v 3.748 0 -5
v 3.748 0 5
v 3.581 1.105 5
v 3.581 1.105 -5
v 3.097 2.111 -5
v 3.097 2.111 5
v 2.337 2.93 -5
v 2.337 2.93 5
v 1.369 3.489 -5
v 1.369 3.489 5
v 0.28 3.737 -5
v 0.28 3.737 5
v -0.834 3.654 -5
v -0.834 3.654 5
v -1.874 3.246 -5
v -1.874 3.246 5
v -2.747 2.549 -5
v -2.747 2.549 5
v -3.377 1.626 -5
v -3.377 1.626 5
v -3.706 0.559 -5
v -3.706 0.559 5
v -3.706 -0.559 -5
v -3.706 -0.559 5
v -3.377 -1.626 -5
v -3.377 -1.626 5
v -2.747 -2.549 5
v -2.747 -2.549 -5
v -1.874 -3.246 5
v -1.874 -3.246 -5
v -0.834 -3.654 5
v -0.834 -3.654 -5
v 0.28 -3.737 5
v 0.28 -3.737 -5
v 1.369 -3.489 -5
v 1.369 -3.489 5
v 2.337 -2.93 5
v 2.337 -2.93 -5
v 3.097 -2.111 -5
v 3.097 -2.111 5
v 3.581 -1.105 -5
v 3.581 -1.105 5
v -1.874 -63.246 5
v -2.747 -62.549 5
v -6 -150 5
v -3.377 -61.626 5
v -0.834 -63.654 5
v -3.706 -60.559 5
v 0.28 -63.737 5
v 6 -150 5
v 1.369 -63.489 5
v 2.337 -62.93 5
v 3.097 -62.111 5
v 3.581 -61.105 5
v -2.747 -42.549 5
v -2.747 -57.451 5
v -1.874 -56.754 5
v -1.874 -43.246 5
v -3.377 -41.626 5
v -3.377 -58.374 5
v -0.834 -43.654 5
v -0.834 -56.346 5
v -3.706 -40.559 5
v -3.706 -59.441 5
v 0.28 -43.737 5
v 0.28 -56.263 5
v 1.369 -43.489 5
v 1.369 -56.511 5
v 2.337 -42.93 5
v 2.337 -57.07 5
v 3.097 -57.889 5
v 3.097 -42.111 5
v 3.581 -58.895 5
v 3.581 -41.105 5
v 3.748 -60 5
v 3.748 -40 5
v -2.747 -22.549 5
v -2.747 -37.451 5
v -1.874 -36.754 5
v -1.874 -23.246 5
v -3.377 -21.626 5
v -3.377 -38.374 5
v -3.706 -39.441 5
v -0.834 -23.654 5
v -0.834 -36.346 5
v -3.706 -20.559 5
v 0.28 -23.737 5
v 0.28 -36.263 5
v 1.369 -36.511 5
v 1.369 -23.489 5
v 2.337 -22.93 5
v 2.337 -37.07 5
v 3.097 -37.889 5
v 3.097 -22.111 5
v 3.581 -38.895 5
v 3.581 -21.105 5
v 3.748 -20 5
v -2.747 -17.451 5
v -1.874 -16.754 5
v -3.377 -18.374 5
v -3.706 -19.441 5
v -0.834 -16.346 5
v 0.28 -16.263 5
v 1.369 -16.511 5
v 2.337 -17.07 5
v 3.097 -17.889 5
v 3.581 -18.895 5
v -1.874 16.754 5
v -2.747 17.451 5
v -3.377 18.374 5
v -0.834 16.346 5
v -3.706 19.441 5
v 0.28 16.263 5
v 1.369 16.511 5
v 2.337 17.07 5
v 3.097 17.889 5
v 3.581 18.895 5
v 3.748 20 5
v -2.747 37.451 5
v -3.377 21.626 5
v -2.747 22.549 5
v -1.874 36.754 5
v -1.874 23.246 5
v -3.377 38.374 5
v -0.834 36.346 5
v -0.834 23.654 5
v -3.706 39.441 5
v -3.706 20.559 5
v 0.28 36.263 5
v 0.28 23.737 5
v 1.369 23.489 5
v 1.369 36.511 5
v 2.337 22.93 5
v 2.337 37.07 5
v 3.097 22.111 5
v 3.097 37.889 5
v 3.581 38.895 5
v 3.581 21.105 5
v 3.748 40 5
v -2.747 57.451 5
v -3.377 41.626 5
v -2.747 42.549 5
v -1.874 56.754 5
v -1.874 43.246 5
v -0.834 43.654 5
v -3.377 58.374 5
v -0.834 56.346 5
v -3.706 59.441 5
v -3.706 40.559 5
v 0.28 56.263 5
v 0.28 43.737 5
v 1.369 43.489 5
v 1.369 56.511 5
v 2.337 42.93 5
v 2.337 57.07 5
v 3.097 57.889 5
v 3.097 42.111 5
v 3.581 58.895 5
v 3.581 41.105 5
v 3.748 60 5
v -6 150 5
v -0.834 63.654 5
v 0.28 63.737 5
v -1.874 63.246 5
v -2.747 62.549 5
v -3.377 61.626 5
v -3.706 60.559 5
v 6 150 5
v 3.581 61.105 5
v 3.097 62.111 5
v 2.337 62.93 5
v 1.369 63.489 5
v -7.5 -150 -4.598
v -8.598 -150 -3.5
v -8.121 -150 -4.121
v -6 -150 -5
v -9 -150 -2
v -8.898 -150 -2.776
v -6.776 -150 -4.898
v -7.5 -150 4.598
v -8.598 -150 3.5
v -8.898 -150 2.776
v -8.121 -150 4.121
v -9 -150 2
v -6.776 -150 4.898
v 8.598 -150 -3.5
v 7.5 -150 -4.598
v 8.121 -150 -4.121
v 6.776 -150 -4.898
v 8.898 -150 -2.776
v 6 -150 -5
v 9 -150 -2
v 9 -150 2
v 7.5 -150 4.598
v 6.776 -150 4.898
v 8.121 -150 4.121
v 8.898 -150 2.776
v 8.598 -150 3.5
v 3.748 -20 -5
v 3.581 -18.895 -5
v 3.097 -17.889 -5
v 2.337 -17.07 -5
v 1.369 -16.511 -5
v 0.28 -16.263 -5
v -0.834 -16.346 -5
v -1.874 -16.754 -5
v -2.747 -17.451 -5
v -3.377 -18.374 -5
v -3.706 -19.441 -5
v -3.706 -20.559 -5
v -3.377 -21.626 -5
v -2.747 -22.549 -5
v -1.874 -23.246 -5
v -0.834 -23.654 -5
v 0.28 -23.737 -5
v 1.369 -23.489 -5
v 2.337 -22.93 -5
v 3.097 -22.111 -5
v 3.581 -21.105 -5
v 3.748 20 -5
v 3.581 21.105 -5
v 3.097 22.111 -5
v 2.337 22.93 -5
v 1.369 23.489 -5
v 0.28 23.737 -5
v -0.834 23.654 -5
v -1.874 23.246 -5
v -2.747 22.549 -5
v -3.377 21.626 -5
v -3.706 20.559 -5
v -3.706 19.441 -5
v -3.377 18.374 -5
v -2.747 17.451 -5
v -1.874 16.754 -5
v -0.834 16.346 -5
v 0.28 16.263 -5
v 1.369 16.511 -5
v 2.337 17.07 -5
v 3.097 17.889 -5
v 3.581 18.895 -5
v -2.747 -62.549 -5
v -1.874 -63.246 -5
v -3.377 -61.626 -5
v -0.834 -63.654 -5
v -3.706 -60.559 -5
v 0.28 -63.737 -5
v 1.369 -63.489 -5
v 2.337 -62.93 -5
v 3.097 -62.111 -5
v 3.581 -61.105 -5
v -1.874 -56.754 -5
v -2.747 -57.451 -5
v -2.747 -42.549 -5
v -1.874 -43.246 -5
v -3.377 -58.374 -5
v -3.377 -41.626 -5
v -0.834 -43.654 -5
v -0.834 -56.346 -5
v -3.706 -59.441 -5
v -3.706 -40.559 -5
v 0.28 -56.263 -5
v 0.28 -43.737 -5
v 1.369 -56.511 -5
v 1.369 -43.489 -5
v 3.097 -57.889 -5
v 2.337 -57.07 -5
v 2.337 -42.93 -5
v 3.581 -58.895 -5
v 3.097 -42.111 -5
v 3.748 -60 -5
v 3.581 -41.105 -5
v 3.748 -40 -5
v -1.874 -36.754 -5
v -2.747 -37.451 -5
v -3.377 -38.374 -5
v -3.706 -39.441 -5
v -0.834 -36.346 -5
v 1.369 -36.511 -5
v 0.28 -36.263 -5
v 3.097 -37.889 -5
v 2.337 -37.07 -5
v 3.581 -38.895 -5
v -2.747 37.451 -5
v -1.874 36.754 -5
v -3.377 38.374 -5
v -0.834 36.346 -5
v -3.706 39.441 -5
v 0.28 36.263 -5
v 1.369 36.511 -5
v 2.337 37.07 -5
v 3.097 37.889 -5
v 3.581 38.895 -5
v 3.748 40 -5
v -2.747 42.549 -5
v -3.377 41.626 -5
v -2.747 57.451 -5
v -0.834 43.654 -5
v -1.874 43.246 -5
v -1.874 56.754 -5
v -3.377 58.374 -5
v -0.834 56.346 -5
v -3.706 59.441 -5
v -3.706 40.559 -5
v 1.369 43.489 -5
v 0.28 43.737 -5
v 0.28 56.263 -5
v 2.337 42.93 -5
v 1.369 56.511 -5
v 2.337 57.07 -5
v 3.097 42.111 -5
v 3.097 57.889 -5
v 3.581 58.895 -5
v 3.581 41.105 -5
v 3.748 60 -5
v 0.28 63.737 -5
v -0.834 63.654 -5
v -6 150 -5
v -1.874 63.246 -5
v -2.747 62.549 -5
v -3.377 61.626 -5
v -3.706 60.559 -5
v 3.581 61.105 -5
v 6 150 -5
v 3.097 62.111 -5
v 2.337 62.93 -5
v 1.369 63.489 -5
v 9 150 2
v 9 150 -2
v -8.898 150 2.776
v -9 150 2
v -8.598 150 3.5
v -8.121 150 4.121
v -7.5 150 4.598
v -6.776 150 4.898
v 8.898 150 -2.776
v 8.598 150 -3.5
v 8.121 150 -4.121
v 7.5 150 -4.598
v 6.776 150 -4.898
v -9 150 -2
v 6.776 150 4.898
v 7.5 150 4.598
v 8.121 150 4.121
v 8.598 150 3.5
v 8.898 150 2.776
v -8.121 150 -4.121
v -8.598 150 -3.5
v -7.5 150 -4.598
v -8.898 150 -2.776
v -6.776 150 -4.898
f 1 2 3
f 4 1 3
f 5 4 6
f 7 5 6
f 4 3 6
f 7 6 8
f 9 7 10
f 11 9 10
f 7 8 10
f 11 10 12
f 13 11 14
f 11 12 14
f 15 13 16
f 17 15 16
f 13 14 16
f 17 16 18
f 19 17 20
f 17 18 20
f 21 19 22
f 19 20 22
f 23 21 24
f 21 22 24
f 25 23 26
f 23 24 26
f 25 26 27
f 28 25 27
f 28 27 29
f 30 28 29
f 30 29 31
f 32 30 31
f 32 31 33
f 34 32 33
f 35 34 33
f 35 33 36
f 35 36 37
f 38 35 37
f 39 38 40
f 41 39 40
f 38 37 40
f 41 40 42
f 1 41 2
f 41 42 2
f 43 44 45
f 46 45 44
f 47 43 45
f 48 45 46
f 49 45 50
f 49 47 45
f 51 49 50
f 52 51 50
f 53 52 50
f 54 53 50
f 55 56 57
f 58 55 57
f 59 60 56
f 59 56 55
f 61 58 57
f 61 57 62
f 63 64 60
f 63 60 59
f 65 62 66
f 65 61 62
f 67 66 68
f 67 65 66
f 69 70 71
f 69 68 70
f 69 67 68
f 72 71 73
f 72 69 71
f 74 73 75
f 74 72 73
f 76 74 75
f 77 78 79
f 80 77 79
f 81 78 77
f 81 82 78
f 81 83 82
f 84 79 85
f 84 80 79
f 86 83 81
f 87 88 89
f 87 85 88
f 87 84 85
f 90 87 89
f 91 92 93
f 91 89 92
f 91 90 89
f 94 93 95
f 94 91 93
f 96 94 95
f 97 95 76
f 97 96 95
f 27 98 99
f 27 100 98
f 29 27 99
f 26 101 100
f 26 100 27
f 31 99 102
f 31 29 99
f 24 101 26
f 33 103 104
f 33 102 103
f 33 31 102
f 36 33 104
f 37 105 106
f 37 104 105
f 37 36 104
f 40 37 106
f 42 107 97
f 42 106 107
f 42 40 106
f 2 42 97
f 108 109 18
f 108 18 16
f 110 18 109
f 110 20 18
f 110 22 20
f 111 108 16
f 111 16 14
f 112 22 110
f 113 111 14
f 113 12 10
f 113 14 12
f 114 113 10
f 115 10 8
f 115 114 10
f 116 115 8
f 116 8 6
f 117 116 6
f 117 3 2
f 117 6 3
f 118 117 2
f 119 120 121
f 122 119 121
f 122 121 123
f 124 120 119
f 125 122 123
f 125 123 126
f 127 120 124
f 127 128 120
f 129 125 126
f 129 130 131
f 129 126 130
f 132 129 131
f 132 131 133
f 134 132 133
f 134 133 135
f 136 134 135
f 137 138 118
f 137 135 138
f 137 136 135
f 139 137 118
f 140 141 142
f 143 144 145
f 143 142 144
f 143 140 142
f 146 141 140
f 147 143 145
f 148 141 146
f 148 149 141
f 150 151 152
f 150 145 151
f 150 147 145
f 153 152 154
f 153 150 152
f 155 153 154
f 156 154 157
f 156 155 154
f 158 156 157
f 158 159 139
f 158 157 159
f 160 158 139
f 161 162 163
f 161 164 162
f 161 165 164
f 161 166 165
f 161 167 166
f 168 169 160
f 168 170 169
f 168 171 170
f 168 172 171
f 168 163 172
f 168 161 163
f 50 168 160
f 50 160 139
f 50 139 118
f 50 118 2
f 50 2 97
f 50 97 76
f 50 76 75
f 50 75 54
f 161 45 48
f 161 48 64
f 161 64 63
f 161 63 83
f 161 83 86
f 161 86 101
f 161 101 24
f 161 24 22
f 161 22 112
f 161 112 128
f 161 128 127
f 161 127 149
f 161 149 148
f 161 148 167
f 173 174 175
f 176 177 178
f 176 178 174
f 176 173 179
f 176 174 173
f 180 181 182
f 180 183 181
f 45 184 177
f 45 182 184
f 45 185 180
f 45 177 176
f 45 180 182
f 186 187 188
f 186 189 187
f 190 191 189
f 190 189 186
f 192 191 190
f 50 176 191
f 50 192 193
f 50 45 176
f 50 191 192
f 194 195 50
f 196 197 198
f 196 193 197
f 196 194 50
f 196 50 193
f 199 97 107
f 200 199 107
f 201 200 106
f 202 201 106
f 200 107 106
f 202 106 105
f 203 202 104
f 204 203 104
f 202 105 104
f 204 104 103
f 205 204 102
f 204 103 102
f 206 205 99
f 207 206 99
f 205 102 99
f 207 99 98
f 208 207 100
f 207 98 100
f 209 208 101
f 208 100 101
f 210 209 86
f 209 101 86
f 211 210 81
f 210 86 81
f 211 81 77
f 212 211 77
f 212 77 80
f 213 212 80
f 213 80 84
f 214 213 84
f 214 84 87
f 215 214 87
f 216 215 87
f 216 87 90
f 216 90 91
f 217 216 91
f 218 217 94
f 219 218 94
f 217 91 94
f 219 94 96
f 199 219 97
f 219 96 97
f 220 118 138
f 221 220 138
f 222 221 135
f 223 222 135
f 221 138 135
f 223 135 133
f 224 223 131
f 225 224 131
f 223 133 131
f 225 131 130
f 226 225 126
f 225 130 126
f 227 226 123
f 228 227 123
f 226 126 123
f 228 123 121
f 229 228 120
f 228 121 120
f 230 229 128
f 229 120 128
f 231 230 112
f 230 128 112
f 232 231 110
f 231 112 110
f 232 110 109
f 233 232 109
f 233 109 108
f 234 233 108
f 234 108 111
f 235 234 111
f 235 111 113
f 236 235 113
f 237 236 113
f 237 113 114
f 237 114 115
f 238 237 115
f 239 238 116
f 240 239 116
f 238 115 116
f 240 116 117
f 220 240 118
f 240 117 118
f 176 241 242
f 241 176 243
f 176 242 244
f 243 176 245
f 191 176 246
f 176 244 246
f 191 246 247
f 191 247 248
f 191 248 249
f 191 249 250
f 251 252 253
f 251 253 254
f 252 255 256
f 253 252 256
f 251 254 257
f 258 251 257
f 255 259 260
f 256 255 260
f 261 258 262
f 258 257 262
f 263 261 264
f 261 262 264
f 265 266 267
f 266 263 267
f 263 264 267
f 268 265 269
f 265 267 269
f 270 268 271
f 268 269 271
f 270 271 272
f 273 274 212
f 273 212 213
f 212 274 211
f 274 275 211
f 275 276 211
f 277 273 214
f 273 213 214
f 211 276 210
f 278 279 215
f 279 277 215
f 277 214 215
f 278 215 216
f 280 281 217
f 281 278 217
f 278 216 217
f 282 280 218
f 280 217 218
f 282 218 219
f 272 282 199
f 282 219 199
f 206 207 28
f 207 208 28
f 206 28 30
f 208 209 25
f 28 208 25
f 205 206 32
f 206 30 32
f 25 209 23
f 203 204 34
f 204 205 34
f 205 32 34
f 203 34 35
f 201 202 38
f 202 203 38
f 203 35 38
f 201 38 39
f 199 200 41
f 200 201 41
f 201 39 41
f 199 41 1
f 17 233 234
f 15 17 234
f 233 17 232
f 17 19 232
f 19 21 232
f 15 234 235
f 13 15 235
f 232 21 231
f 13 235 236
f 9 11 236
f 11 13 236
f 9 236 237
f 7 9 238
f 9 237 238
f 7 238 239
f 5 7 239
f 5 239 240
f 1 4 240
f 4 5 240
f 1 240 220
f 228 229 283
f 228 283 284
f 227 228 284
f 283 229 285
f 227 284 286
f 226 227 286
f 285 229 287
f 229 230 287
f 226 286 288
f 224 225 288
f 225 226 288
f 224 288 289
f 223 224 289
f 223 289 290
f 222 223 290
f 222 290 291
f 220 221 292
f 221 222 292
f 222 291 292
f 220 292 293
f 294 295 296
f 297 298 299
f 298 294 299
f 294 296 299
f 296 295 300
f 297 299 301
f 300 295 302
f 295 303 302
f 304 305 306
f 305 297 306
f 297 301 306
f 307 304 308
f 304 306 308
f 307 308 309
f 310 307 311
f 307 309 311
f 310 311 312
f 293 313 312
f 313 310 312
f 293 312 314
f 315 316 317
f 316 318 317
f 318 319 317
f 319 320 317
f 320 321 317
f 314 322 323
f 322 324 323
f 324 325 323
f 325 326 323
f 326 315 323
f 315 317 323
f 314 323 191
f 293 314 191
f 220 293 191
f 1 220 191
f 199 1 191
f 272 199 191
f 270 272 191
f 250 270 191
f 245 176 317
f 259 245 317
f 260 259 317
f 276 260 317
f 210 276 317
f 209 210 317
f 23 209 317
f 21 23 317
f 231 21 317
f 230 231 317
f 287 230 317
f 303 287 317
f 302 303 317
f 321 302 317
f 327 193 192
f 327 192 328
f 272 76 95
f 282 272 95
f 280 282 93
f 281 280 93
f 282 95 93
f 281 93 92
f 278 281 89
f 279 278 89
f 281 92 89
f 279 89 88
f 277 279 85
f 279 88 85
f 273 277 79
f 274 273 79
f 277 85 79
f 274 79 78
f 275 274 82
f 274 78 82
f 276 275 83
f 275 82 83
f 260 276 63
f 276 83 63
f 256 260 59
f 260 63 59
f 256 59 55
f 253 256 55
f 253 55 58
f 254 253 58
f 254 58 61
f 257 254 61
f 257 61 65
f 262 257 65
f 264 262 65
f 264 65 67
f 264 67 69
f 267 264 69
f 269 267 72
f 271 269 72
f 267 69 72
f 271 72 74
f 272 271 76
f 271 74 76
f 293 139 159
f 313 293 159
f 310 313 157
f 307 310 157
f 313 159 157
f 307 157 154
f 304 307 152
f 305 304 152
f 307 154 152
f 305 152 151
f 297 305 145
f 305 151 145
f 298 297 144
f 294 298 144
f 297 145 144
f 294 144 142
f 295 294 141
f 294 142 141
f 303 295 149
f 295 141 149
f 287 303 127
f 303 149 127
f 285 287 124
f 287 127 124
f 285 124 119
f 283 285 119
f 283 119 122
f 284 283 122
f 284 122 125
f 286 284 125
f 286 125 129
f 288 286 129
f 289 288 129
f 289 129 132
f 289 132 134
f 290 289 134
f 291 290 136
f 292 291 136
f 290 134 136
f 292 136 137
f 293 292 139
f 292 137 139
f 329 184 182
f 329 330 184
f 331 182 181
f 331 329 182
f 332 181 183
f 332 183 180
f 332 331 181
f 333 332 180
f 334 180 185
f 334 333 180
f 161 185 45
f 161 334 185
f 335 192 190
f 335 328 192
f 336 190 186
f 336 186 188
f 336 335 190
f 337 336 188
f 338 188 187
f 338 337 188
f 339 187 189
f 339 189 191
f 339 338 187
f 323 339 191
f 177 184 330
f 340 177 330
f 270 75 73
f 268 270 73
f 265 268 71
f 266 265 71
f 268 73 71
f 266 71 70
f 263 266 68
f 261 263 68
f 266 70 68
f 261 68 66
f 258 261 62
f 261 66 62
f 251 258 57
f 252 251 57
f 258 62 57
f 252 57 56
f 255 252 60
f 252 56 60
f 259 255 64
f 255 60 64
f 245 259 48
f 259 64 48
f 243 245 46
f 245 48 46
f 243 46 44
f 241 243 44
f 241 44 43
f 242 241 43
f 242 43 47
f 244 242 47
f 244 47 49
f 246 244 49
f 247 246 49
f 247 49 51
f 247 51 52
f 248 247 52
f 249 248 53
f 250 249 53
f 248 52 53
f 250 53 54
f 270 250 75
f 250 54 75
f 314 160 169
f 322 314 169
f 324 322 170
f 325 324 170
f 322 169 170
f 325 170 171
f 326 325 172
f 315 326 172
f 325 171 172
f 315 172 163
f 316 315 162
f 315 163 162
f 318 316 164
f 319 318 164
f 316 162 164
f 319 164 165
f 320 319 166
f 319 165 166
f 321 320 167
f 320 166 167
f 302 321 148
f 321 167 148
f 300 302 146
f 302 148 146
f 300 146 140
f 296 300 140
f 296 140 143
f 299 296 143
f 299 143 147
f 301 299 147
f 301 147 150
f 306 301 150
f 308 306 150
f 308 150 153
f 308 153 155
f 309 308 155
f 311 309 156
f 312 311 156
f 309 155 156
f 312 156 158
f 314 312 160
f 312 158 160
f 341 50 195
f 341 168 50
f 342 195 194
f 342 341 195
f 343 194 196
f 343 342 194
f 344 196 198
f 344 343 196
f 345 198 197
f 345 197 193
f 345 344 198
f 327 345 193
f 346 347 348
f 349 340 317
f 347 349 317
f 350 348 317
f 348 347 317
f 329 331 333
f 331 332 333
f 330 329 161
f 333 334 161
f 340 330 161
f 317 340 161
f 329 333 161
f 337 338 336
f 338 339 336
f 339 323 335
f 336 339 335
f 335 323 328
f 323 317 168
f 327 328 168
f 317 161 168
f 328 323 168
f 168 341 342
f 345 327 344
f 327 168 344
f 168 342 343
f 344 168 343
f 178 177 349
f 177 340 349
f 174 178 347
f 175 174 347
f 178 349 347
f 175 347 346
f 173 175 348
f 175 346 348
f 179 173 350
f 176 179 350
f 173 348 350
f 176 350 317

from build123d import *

# Parameters (mm, degrees)
CROQUIS1_W              = 18
CROQUIS1_H              = 300
SALIENTE_EXTRUIR1_DEPTH = 5
REDONDEO2_R             = 3
CROQUIS2_R              = 3.747917417
CORTAR_EXTRUIR1_DEPTH   = 10


with BuildPart() as part:
    # Croquis1 → Saliente-Extruir1 (new, symmetric)
    with BuildSketch(Plane.XY):
        Rectangle(CROQUIS1_W, CROQUIS1_H)
    extrude(amount=SALIENTE_EXTRUIR1_DEPTH, both=True)

    # Redondeo2
    redondeo2_edges = [part.edges().sort_by_distance(p)[0] for p in [
        (-9, 0, 5),
        (9, 0, 5),
        (-9, 0, -5),
        (9, 0, -5),
    ]]
    fillet(redondeo2_edges, radius=REDONDEO2_R)

    # Croquis2 → Cortar-Extruir1 (cut)
    with BuildSketch(Plane.XY.offset(5)):
        Circle(CROQUIS2_R)
        with Locations((0, 20)):
            Circle(CROQUIS2_R)
        with Locations((0, 40)):
            Circle(CROQUIS2_R)
        with Locations((0, 60)):
            Circle(CROQUIS2_R)
        with Locations((0, -20)):
            Circle(CROQUIS2_R)
        with Locations((0, -60)):
            Circle(CROQUIS2_R)
        with Locations((0, -40)):
            Circle(CROQUIS2_R)
    extrude(amount=-CORTAR_EXTRUIR1_DEPTH, mode=Mode.SUBTRACT)


solid = part.part
